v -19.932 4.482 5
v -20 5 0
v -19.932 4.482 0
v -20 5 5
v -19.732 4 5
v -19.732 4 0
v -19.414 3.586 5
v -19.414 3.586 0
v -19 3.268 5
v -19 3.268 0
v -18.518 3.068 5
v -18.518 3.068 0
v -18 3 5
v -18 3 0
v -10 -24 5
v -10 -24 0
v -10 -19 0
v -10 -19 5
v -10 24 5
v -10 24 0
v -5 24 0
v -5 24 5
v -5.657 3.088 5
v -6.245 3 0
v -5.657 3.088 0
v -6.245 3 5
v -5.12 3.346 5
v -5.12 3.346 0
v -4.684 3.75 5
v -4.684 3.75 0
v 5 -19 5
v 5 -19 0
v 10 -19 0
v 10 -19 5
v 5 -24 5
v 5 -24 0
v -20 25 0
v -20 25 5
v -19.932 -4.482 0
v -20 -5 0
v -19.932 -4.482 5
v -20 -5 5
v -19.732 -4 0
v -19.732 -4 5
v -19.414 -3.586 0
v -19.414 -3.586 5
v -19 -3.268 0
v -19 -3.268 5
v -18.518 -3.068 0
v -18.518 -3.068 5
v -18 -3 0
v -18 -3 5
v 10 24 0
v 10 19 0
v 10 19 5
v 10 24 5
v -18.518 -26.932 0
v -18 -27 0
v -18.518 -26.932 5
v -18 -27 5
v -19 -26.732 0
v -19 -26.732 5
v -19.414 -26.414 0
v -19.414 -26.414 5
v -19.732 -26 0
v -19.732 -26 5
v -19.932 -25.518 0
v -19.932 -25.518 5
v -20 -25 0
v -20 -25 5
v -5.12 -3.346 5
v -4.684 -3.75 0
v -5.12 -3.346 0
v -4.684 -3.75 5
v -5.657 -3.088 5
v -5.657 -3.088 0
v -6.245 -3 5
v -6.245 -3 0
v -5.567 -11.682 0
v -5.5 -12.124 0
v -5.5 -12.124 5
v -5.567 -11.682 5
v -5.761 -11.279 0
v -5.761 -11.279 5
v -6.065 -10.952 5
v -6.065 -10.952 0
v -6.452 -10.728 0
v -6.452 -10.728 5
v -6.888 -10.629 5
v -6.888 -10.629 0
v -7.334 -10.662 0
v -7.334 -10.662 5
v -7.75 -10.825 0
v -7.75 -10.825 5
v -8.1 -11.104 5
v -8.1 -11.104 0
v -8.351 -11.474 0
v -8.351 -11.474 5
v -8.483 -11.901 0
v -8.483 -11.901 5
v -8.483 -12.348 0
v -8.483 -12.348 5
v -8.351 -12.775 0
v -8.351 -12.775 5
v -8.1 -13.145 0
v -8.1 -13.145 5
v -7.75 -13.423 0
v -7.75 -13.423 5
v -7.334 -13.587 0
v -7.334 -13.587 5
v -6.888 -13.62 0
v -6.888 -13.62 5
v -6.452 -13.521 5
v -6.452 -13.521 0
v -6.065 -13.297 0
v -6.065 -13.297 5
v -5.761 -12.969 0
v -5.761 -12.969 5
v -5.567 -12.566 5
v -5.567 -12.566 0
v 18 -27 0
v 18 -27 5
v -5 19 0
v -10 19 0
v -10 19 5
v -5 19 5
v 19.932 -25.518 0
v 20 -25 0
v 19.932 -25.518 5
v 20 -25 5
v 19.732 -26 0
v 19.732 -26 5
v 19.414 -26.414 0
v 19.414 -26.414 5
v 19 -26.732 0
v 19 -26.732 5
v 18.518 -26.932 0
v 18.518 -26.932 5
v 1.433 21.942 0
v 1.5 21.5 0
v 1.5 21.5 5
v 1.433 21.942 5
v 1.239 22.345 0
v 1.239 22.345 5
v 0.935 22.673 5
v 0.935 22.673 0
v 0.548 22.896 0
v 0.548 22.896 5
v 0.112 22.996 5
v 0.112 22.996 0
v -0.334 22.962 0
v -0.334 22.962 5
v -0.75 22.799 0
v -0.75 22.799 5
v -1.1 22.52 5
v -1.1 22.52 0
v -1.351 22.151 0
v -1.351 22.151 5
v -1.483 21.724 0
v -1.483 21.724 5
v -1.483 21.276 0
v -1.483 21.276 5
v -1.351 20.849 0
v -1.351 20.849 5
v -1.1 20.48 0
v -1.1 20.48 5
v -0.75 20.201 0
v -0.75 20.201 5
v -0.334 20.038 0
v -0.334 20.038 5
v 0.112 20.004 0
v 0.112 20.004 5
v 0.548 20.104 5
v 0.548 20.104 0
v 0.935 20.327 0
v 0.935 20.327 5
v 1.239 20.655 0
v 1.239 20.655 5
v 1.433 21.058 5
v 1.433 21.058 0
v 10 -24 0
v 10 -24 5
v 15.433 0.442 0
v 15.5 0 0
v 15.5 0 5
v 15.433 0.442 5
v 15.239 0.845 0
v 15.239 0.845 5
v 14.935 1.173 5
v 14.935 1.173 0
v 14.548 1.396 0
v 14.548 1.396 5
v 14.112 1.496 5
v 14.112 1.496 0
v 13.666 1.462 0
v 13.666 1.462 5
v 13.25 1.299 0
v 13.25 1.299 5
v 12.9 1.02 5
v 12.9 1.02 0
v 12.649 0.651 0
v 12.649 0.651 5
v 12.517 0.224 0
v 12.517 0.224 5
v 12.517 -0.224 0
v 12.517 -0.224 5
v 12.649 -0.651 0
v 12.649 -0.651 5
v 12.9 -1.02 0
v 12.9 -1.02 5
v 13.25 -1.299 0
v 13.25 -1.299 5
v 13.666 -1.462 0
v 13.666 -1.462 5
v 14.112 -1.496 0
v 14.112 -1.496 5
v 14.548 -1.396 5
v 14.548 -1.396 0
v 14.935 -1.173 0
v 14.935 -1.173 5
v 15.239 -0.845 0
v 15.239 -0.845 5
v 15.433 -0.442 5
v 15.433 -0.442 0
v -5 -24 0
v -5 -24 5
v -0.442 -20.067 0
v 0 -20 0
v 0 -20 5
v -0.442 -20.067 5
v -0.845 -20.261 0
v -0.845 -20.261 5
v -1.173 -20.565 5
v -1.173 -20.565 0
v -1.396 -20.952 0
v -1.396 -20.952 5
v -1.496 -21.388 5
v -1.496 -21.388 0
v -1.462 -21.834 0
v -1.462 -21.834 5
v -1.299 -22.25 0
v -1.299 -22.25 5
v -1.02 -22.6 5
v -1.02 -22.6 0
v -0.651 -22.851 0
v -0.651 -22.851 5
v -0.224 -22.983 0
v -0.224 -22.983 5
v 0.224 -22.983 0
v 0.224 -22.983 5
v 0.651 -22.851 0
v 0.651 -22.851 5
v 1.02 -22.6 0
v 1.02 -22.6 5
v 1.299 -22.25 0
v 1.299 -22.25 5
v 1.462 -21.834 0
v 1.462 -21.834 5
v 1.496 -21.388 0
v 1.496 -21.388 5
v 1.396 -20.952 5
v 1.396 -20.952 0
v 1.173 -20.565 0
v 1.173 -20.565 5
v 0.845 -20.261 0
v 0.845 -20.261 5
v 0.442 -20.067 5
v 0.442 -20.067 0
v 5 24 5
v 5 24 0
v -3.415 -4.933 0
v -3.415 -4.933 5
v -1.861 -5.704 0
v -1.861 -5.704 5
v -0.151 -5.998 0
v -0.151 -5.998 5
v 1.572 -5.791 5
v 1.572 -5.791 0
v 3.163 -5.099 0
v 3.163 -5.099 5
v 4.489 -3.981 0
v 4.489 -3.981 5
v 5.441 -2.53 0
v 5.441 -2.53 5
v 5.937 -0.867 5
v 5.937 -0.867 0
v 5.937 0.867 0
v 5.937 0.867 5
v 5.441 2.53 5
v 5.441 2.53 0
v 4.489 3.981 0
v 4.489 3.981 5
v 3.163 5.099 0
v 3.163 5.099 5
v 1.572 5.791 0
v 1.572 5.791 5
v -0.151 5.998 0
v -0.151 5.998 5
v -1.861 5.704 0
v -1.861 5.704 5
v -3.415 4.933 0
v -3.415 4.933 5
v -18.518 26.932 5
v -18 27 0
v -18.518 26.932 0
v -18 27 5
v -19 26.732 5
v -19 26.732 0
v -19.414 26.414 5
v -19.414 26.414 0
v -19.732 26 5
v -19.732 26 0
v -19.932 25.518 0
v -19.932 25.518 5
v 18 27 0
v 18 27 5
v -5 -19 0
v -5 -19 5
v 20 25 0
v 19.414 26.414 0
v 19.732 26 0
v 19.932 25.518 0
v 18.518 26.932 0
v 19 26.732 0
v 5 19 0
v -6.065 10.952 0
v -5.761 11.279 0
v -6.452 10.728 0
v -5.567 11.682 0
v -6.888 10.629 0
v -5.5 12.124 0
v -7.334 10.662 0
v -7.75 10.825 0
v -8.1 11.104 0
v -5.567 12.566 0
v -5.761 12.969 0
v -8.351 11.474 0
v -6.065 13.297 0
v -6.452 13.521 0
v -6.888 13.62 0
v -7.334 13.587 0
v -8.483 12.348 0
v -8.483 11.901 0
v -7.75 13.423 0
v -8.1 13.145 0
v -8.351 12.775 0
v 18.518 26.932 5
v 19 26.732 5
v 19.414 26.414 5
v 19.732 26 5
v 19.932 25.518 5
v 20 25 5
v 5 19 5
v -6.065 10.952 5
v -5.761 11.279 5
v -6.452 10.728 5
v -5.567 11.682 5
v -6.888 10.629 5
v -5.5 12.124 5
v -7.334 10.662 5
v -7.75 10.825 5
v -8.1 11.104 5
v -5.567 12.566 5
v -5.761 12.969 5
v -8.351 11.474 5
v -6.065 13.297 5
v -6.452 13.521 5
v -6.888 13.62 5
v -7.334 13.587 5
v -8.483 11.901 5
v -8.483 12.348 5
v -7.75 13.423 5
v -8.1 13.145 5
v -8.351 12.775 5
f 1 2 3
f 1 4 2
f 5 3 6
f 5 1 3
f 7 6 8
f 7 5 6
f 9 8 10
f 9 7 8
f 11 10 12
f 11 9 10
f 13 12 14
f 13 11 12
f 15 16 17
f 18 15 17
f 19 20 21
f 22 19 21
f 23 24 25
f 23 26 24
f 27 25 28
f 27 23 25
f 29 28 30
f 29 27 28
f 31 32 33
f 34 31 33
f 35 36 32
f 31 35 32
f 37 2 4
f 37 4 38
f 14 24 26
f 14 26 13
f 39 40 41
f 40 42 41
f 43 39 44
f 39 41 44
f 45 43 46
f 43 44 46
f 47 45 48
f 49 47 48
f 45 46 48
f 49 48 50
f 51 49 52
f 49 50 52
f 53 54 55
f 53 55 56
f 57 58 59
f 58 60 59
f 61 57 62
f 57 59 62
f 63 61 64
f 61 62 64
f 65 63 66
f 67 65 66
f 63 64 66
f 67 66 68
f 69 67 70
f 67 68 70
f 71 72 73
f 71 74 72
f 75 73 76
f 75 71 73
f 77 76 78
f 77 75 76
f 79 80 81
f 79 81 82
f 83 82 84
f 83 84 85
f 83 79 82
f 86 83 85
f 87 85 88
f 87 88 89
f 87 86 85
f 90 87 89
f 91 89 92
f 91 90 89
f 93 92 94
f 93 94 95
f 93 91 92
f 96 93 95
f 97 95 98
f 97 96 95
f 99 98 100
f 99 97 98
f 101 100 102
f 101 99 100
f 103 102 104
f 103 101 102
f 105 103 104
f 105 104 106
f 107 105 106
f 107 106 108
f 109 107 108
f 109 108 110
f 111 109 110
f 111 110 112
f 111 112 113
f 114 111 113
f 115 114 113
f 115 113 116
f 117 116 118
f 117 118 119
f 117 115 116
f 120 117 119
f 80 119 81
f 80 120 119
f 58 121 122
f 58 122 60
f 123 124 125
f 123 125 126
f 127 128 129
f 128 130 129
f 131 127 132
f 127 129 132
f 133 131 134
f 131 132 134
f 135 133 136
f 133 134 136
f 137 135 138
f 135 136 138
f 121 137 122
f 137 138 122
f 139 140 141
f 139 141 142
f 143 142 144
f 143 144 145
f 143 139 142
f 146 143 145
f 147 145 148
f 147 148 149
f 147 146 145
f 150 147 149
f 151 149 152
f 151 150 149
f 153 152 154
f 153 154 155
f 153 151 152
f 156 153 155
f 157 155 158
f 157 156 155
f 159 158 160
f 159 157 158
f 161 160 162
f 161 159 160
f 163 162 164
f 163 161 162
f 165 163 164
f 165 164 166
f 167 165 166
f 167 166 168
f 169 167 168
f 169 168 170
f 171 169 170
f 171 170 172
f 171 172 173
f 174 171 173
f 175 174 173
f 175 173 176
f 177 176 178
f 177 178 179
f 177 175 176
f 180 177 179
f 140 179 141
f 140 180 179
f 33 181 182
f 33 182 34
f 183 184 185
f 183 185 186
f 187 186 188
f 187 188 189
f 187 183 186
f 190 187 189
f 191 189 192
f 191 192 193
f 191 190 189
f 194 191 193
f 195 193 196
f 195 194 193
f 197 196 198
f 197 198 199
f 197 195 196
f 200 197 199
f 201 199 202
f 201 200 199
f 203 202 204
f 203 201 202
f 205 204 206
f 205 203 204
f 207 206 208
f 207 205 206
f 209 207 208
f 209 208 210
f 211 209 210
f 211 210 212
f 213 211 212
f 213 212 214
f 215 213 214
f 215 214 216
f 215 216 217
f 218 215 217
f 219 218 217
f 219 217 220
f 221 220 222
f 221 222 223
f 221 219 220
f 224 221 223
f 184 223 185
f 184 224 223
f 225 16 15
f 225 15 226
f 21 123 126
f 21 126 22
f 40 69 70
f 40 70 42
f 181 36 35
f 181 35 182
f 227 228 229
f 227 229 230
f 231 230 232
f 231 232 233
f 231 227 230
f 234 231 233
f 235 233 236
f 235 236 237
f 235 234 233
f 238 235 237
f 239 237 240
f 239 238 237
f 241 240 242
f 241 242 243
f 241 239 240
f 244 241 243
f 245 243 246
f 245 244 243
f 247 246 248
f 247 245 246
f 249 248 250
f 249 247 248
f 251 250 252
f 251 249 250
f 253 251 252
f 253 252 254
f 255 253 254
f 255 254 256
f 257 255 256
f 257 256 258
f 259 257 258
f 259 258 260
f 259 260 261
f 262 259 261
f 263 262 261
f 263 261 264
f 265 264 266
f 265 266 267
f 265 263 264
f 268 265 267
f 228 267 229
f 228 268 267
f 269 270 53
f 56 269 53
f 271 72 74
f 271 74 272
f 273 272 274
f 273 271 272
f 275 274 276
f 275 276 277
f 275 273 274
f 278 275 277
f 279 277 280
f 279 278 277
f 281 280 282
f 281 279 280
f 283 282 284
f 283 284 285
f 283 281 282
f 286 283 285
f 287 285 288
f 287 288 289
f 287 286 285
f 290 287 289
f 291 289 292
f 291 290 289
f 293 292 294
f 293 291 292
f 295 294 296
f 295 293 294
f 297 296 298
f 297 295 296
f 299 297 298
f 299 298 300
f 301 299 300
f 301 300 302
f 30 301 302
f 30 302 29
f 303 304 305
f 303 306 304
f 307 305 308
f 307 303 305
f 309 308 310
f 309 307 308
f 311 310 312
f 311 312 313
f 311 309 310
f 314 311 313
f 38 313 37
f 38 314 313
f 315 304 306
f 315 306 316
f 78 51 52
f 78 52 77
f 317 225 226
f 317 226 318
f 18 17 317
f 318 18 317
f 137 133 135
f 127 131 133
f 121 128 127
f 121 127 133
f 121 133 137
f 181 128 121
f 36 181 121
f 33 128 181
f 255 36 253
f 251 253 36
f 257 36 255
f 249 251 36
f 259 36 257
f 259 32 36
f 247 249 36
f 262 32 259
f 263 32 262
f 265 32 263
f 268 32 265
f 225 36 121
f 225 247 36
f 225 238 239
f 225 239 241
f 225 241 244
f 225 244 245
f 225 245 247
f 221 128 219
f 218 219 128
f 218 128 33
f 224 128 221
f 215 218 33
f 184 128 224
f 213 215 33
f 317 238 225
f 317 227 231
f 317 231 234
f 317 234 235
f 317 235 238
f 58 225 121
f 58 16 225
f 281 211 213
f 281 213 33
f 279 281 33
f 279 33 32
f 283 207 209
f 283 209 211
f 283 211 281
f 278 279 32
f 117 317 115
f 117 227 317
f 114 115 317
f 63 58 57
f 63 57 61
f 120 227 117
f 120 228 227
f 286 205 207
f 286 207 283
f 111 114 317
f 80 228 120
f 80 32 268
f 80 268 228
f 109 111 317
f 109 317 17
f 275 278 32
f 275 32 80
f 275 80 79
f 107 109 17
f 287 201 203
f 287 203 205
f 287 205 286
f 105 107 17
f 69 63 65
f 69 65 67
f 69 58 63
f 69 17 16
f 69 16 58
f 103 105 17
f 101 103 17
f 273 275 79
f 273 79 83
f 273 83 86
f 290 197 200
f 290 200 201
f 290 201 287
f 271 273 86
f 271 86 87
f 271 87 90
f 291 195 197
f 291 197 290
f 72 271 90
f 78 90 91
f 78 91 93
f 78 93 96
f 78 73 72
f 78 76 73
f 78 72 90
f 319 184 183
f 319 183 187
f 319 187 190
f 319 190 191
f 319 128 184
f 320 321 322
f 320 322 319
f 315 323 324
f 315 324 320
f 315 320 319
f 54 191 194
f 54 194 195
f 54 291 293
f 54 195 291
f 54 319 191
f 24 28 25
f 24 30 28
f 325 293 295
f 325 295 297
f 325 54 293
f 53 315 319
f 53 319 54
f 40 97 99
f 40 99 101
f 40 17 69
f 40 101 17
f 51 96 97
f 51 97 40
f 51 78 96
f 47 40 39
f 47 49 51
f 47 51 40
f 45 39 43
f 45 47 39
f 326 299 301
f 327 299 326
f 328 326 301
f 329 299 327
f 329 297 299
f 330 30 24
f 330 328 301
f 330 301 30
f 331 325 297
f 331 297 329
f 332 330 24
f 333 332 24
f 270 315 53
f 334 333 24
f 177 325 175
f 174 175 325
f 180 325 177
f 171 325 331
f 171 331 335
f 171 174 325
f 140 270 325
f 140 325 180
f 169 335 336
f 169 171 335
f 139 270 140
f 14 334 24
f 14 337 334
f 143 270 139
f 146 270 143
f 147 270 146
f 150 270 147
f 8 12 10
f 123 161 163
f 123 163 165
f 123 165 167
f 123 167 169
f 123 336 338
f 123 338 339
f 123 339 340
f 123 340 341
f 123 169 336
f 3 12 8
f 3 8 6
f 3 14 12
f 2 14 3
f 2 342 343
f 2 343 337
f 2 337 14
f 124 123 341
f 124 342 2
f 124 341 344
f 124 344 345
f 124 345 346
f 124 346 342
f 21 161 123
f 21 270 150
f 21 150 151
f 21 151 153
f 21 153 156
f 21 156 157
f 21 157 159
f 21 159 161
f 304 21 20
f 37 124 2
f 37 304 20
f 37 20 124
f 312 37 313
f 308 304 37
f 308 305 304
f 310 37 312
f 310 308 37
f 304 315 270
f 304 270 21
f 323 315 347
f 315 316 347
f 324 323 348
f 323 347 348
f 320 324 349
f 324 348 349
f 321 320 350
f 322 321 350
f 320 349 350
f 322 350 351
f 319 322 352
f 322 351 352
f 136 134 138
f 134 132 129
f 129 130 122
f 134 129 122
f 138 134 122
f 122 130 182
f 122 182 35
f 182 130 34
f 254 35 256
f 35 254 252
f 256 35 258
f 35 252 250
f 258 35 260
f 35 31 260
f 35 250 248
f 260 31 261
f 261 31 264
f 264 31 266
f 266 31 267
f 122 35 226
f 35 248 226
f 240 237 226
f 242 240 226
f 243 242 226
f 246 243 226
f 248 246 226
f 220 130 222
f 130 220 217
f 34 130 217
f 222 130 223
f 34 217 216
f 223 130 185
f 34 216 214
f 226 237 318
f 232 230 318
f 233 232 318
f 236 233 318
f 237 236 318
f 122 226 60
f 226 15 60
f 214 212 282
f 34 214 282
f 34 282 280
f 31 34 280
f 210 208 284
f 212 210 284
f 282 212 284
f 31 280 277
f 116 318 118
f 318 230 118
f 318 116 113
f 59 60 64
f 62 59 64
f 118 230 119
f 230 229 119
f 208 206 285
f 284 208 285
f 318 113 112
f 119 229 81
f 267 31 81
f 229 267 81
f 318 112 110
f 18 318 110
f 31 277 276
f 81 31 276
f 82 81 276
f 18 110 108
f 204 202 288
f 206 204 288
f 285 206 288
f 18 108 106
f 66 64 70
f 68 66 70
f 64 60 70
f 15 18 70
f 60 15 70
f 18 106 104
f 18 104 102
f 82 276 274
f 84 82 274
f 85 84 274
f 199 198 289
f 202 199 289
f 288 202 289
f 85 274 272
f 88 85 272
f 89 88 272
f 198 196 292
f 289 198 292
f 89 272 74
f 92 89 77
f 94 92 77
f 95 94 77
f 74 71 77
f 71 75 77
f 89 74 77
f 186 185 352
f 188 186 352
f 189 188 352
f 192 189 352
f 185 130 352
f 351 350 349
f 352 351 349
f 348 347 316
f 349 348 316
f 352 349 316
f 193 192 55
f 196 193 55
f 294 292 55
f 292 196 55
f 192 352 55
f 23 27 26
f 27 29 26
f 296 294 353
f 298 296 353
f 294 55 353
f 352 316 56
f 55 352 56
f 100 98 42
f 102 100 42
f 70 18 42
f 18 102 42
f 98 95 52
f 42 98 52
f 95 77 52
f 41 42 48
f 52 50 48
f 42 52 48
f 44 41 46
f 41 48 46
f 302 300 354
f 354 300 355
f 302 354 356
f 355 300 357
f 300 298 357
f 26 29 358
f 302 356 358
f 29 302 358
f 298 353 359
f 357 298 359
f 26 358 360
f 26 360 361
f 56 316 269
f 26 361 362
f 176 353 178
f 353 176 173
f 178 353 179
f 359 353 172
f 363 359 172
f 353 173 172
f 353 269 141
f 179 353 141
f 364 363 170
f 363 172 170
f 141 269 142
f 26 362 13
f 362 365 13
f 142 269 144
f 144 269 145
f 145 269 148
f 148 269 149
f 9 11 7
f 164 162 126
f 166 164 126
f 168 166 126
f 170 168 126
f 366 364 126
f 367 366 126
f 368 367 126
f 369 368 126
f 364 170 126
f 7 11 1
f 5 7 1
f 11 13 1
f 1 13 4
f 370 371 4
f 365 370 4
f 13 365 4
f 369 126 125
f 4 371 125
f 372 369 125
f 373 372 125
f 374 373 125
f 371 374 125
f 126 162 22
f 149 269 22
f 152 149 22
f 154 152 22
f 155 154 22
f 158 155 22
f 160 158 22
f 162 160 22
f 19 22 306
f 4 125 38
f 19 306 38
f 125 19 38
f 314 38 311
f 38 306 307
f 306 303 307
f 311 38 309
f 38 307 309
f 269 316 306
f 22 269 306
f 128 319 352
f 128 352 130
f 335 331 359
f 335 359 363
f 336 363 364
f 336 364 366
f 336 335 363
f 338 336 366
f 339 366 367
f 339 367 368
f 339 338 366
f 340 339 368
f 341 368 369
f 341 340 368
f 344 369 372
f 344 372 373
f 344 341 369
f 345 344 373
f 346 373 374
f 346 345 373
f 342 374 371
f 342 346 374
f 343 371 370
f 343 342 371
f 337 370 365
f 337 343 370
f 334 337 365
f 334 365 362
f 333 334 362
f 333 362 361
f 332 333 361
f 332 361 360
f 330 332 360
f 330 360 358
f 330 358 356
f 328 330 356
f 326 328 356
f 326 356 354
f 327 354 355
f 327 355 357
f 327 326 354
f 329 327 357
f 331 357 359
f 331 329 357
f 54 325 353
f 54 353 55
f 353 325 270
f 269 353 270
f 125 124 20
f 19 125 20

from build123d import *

# Parameters (mm, degrees)
ESQUISSE1_R        = 1.5
ESQUISSE1_W        = 5
ESQUISSE1_H        = 5
BOSS_EXTRU_1_DEPTH = 5
CONG_1_R           = 2


with BuildPart() as part:
    # Esquisse1 → Boss.-Extru.1 (new body)
    with BuildSketch(Plane.XY):
        with BuildLine():
            Line((-20, 27), (20, 27))
            Line((20, 27), (20, -27))
            Line((20, -27), (-20, -27))
            Line((-20, -27), (-20, -3))
            Line((-20, -3), (-5.196152423, -3))
            ThreePointArc((-5.196152423, -3), (6, 0), (-5.196152423, 3))
            Line((-5.196152423, 3), (-20, 3))
            Line((-20, 3), (-20, 27))
        make_face()
        with Locations((14, 0)):
            Circle(ESQUISSE1_R, mode=Mode.SUBTRACT)
        with Locations((-7, -12.124355653)):
            Circle(ESQUISSE1_R, mode=Mode.SUBTRACT)
        with Locations((-7, 12.124355653)):
            Circle(ESQUISSE1_R, mode=Mode.SUBTRACT)
        with Locations((0, 21.5)):
            Circle(ESQUISSE1_R, mode=Mode.SUBTRACT)
        with Locations(Location((0, -21.5, 0), (0, 0, 90))):
            Circle(ESQUISSE1_R, mode=Mode.SUBTRACT)
        with Locations((-7.5, 21.5)):
            Rectangle(ESQUISSE1_W, ESQUISSE1_H, mode=Mode.SUBTRACT)
        with Locations((7.5, 21.5)):
            Rectangle(ESQUISSE1_W, ESQUISSE1_H, mode=Mode.SUBTRACT)
        with Locations((-7.5, -21.5)):
            Rectangle(ESQUISSE1_W, ESQUISSE1_H, mode=Mode.SUBTRACT)
        with Locations((7.5, -21.5)):
            Rectangle(ESQUISSE1_W, ESQUISSE1_H, mode=Mode.SUBTRACT)
    extrude(amount=BOSS_EXTRU_1_DEPTH)

    # Congé1
    cong_1_edges = [part.edges().sort_by_distance(p)[0] for p in [
        (-20, -27, 2.5),
        (-20, -3, 2.5),
        (-5.196152423, -3, 2.5),
        (-5.196152423, 3, 2.5),
        (-20, 3, 2.5),
        (-20, 27, 2.5),
        (20, 27, 2.5),
        (20, -27, 2.5),
    ]]
    fillet(cong_1_edges, radius=CONG_1_R)


solid = part.part
